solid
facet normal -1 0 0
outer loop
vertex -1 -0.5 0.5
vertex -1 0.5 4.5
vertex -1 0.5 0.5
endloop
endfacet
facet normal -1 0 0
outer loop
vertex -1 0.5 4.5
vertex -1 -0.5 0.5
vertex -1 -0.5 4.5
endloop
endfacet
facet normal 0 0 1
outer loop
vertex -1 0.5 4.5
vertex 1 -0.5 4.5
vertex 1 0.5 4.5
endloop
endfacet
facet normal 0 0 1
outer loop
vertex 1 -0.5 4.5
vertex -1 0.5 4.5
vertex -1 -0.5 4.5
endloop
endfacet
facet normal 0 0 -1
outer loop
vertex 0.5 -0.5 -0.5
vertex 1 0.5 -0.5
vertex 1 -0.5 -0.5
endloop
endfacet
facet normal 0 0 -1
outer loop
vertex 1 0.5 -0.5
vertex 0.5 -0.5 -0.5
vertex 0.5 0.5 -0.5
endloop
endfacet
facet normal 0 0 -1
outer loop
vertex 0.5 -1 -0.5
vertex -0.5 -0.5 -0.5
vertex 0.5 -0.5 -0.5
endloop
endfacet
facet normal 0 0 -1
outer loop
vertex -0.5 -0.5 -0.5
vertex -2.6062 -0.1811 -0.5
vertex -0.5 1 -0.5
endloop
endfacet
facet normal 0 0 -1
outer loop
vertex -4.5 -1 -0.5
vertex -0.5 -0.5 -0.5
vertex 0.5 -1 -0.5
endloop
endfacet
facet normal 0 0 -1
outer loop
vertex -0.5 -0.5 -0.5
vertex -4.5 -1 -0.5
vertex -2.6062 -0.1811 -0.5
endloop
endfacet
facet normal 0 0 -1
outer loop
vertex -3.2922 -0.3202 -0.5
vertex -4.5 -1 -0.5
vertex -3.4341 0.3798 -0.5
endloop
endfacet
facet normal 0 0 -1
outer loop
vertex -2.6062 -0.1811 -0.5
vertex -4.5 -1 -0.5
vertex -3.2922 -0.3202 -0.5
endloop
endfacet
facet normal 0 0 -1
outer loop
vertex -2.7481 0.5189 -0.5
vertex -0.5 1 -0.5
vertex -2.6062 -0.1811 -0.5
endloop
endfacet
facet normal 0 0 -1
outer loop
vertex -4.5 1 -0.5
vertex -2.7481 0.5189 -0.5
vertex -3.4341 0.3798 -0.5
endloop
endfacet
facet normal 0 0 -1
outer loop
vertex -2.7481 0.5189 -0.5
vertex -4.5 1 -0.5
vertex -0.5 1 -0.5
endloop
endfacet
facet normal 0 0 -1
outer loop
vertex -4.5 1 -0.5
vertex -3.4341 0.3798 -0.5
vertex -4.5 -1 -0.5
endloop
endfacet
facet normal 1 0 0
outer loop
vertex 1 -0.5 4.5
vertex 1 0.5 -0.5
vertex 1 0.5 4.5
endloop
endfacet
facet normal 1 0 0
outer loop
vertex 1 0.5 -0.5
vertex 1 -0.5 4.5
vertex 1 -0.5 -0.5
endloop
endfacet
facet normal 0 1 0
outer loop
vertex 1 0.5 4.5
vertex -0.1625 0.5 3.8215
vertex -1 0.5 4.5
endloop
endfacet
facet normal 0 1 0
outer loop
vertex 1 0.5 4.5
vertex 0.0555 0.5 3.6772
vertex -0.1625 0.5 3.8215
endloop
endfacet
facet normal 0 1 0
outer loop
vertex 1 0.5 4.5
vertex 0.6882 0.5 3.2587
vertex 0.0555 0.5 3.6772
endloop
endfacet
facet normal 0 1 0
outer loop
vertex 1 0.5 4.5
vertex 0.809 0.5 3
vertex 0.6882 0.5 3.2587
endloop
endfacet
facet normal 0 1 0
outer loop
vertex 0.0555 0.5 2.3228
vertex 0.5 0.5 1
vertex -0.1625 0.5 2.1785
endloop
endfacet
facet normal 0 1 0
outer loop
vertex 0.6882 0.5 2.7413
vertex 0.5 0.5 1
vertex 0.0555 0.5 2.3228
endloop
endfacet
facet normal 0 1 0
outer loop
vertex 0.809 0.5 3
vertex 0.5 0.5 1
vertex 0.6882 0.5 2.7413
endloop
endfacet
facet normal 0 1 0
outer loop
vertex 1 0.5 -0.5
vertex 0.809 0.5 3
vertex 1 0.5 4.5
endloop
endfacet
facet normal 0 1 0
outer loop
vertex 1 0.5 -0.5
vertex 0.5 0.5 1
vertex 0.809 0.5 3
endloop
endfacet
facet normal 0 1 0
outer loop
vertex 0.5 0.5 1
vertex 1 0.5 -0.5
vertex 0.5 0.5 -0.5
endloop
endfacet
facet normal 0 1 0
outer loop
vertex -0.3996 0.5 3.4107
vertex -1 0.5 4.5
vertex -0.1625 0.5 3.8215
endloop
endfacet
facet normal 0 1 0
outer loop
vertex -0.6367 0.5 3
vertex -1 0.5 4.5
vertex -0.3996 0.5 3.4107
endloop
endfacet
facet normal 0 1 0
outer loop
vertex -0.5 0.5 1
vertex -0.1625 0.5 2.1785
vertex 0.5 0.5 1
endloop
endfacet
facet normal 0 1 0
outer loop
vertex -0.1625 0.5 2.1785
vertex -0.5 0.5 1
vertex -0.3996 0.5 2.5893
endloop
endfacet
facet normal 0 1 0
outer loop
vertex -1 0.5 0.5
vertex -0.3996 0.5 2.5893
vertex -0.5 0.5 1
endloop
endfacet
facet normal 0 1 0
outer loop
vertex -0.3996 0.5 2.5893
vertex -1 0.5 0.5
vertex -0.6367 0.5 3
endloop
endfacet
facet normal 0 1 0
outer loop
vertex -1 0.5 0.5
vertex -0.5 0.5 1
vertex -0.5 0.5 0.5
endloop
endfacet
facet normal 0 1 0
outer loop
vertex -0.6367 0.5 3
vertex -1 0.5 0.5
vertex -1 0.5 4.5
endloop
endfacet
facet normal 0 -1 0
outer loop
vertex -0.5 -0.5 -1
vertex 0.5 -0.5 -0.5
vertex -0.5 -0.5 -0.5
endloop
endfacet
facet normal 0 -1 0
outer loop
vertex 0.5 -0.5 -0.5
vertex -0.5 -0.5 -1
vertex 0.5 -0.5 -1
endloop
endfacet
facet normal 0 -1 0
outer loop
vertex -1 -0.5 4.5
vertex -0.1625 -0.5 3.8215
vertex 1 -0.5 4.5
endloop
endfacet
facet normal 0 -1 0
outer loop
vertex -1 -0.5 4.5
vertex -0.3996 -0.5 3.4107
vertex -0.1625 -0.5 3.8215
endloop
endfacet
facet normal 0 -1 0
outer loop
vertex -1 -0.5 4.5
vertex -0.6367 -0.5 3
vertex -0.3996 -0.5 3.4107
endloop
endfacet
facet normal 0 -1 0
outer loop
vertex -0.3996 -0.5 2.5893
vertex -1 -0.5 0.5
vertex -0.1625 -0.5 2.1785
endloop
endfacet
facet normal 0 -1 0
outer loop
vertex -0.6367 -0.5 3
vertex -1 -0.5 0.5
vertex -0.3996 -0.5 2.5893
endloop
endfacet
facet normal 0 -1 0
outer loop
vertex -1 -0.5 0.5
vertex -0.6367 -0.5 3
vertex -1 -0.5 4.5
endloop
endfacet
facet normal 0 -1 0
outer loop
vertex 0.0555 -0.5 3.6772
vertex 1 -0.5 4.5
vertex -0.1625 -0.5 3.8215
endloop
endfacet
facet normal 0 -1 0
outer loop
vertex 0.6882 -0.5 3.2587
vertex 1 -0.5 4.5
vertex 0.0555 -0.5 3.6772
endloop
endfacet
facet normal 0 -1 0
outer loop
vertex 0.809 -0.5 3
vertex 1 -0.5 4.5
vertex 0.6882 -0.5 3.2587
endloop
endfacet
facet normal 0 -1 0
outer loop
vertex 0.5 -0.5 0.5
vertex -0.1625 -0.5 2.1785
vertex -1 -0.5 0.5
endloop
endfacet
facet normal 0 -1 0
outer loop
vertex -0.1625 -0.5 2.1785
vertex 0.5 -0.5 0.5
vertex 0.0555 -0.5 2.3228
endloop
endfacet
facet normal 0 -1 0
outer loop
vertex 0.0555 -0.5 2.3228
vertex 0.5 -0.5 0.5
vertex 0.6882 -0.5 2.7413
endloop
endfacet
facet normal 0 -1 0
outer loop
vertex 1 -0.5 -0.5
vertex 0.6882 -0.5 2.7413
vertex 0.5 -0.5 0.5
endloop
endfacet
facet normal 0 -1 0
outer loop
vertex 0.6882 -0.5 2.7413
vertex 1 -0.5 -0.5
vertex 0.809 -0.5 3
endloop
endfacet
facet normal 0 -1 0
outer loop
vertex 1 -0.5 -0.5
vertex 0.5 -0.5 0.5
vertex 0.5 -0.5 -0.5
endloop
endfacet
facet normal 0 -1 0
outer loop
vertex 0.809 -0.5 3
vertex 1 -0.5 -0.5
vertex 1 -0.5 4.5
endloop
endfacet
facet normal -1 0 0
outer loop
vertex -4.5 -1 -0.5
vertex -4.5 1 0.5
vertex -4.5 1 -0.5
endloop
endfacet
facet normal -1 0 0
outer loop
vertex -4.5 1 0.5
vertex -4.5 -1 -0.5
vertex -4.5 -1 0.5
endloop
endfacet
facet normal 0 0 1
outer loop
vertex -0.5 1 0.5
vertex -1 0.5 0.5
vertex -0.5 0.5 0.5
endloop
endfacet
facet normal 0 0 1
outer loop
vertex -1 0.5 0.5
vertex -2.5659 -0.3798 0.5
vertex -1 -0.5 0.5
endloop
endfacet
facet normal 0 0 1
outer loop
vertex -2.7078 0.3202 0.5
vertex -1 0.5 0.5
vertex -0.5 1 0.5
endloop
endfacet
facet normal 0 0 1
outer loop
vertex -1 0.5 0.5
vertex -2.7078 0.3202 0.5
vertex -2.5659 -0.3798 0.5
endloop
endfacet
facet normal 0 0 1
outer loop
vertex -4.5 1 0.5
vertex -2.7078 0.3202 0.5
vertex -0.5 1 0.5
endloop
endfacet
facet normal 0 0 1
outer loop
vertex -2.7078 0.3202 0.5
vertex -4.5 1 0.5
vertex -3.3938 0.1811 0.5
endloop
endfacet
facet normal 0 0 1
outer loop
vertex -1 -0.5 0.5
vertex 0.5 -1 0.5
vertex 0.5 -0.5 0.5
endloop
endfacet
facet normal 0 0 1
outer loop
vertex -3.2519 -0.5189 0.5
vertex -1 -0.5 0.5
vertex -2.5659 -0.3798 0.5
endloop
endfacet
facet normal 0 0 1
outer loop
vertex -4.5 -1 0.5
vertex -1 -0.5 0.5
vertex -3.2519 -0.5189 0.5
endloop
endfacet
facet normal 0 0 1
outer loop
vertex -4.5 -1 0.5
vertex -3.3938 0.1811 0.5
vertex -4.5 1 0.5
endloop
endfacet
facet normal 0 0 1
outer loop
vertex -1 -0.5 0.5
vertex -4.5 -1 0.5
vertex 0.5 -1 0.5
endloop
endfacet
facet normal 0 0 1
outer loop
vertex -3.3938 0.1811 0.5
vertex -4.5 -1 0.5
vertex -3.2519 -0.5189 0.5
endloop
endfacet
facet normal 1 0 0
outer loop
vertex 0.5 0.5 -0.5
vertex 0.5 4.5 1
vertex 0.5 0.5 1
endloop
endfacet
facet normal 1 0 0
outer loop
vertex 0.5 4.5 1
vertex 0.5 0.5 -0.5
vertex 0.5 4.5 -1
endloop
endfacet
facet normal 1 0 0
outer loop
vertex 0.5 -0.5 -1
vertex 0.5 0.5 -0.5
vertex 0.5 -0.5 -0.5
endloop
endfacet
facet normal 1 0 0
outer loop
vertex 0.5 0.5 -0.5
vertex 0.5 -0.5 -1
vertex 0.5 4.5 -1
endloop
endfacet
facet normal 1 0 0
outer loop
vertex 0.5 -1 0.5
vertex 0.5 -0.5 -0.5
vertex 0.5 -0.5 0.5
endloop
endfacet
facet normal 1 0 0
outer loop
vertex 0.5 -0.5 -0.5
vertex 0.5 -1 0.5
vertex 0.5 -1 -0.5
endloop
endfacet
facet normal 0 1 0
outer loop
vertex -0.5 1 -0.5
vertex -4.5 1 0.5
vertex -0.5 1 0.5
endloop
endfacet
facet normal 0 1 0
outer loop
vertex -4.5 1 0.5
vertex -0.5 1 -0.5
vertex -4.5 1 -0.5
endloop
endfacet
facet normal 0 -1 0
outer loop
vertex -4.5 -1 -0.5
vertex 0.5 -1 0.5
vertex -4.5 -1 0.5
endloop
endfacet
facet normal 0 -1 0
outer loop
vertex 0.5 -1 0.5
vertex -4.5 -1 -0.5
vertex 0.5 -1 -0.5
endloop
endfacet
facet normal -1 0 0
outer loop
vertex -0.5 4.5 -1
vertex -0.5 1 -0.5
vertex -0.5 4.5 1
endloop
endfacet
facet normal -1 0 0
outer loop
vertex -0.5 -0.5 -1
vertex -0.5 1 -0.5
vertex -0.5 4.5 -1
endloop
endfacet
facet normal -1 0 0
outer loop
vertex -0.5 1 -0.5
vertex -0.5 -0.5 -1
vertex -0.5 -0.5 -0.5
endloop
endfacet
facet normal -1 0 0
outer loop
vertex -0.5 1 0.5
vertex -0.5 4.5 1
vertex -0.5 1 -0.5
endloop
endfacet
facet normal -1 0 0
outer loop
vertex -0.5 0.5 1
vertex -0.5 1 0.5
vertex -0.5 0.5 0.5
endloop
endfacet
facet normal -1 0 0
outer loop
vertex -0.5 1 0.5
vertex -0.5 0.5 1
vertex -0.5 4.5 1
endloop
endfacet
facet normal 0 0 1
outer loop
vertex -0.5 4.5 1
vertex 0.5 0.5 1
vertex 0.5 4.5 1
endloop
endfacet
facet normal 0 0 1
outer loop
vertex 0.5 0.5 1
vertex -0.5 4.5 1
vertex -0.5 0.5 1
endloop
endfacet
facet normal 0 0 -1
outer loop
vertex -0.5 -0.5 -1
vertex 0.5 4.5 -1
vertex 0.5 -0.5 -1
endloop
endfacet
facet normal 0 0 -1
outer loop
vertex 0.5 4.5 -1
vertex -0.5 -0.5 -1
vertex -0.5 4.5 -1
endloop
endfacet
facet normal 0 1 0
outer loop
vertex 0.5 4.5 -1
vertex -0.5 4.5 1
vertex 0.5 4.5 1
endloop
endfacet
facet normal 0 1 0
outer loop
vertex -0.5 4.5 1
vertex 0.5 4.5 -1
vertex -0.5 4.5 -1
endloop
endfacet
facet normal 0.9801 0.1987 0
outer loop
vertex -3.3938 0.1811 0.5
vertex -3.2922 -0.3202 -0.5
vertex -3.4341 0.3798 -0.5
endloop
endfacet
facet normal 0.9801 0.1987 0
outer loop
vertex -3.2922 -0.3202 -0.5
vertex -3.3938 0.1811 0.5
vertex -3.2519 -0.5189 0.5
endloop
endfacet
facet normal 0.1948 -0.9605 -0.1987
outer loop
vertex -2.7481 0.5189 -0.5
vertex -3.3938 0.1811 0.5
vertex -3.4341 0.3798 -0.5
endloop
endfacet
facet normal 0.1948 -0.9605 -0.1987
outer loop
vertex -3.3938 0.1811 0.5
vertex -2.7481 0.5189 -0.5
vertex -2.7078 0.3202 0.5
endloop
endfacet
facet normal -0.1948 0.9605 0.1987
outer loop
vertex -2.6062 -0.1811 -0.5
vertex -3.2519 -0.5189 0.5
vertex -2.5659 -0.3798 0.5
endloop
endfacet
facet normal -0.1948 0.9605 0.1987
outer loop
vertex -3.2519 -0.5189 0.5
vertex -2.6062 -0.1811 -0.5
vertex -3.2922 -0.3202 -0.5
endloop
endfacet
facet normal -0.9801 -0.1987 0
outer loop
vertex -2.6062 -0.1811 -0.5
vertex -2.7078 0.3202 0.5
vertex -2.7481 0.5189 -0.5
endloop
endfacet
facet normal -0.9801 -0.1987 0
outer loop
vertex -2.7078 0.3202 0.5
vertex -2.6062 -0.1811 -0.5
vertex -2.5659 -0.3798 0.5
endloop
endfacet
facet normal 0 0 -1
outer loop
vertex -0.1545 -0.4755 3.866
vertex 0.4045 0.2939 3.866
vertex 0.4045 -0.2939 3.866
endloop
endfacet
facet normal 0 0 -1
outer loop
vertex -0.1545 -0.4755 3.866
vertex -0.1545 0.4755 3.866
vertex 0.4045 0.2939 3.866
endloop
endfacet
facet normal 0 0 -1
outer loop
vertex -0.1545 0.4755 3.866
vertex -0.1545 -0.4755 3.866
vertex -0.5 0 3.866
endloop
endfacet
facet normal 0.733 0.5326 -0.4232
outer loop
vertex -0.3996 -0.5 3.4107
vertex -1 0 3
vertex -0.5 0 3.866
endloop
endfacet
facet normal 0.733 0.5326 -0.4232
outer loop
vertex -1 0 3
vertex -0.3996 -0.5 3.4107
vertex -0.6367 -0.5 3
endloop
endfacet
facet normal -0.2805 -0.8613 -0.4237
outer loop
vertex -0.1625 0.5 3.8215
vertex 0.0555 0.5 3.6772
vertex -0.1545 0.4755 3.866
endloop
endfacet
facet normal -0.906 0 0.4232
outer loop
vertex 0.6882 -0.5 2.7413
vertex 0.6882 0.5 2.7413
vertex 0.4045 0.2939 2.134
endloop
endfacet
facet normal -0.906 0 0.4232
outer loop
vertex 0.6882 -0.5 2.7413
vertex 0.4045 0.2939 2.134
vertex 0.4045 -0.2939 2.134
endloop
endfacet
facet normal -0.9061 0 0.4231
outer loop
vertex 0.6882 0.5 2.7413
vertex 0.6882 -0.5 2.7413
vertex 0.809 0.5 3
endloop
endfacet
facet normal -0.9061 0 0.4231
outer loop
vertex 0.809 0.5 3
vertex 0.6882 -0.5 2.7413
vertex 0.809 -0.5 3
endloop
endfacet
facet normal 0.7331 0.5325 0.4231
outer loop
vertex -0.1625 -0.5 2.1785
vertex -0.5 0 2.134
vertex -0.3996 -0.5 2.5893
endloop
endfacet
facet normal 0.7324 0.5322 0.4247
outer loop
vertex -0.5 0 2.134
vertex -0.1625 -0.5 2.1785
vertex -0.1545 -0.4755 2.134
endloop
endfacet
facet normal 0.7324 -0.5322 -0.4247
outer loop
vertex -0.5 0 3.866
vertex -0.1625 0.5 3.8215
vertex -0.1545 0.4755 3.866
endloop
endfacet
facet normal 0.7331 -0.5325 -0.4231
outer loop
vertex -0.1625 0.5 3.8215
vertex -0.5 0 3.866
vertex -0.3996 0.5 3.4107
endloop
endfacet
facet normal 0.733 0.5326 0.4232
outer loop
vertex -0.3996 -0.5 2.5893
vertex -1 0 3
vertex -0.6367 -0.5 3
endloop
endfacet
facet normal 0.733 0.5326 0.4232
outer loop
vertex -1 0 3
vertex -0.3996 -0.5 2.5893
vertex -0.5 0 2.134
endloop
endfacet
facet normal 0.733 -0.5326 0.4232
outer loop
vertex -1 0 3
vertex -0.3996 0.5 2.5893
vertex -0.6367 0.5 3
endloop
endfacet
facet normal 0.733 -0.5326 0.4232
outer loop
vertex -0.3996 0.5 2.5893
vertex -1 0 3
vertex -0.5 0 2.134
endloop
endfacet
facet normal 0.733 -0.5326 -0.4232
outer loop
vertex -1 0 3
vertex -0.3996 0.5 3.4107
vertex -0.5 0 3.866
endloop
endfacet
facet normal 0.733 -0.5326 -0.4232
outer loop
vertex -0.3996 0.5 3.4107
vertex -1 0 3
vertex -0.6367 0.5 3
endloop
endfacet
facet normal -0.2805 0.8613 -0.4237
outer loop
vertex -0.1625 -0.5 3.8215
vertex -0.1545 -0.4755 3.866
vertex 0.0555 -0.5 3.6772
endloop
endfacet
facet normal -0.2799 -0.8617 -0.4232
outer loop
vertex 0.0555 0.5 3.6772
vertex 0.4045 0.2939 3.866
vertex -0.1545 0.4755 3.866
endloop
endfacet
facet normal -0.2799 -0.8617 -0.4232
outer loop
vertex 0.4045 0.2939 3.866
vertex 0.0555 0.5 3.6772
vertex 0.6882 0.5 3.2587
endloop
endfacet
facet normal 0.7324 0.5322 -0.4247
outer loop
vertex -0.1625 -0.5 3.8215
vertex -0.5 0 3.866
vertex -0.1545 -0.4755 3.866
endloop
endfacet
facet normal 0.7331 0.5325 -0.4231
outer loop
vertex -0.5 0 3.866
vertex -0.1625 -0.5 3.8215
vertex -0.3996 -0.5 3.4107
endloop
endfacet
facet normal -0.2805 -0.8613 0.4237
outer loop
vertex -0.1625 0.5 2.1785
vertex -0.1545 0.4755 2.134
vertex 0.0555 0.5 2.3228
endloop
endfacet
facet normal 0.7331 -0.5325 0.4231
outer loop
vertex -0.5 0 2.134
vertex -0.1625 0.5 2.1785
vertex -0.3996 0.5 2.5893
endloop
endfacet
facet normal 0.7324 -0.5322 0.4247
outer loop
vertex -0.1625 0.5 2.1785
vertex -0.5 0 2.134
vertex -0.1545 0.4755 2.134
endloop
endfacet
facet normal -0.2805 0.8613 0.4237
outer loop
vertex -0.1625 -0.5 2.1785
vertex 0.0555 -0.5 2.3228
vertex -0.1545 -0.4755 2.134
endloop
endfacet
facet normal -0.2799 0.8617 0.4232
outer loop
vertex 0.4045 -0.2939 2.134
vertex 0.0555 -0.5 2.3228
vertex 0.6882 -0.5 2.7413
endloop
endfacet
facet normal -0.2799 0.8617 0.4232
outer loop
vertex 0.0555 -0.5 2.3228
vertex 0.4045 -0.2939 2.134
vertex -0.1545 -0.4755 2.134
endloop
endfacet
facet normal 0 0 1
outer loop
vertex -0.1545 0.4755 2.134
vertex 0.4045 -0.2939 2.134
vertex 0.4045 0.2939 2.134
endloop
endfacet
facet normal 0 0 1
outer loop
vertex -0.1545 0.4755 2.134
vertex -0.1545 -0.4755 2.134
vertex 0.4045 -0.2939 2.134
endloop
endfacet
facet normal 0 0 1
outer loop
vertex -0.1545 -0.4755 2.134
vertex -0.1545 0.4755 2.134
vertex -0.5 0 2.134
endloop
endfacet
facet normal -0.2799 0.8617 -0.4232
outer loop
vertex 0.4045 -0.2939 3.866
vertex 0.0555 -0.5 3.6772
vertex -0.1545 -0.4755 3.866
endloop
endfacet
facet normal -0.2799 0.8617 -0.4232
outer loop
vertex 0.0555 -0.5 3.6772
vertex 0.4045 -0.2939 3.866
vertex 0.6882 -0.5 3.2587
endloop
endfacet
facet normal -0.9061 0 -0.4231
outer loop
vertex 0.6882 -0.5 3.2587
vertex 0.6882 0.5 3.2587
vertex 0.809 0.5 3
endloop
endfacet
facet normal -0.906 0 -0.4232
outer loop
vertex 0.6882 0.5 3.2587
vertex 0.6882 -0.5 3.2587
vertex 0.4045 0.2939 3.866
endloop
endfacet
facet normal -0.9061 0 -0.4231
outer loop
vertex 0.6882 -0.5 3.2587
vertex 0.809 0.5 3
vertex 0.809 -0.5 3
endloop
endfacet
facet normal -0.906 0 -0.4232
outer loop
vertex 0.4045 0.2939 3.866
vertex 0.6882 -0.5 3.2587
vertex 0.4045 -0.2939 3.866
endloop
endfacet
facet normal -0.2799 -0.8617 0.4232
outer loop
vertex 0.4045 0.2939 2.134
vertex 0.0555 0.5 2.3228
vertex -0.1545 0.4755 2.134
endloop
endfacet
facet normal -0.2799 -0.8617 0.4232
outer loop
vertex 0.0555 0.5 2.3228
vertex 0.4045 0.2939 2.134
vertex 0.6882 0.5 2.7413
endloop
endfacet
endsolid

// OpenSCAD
module screw() {
    mirror(v=[1, 0, 0]) {
        rotate(a=[11.459155902616464, 0.0, 11.459155902616464]) {
            cube(size=[0.7, 0.7, 5.0], center=true);
        };
    };
};

module sprocket() {
    sphere(r=1.0);
};

mirror(v=[1, 0, 0]) {
    difference() {
        union() {
            translate([0.0, 0.0, 2.0]) {
                cube(size=[2.0, 1.0, 5.0], center=true);
            };
            translate([2.0, 0.0, 0.0]) {
                cube(size=[5.0, 2.0, 1.0], center=true);
            };
            translate([0.0, 2.0, 0.0]) {
                cube(size=[1.0, 5.0, 2.0], center=true);
            };
        };
        translate([3.0, 0.0, 0.0]) {
            screw() {};
        };
        translate([0.0, 0.0, 3.0]) {
            sprocket() {};
        };
    };
};
